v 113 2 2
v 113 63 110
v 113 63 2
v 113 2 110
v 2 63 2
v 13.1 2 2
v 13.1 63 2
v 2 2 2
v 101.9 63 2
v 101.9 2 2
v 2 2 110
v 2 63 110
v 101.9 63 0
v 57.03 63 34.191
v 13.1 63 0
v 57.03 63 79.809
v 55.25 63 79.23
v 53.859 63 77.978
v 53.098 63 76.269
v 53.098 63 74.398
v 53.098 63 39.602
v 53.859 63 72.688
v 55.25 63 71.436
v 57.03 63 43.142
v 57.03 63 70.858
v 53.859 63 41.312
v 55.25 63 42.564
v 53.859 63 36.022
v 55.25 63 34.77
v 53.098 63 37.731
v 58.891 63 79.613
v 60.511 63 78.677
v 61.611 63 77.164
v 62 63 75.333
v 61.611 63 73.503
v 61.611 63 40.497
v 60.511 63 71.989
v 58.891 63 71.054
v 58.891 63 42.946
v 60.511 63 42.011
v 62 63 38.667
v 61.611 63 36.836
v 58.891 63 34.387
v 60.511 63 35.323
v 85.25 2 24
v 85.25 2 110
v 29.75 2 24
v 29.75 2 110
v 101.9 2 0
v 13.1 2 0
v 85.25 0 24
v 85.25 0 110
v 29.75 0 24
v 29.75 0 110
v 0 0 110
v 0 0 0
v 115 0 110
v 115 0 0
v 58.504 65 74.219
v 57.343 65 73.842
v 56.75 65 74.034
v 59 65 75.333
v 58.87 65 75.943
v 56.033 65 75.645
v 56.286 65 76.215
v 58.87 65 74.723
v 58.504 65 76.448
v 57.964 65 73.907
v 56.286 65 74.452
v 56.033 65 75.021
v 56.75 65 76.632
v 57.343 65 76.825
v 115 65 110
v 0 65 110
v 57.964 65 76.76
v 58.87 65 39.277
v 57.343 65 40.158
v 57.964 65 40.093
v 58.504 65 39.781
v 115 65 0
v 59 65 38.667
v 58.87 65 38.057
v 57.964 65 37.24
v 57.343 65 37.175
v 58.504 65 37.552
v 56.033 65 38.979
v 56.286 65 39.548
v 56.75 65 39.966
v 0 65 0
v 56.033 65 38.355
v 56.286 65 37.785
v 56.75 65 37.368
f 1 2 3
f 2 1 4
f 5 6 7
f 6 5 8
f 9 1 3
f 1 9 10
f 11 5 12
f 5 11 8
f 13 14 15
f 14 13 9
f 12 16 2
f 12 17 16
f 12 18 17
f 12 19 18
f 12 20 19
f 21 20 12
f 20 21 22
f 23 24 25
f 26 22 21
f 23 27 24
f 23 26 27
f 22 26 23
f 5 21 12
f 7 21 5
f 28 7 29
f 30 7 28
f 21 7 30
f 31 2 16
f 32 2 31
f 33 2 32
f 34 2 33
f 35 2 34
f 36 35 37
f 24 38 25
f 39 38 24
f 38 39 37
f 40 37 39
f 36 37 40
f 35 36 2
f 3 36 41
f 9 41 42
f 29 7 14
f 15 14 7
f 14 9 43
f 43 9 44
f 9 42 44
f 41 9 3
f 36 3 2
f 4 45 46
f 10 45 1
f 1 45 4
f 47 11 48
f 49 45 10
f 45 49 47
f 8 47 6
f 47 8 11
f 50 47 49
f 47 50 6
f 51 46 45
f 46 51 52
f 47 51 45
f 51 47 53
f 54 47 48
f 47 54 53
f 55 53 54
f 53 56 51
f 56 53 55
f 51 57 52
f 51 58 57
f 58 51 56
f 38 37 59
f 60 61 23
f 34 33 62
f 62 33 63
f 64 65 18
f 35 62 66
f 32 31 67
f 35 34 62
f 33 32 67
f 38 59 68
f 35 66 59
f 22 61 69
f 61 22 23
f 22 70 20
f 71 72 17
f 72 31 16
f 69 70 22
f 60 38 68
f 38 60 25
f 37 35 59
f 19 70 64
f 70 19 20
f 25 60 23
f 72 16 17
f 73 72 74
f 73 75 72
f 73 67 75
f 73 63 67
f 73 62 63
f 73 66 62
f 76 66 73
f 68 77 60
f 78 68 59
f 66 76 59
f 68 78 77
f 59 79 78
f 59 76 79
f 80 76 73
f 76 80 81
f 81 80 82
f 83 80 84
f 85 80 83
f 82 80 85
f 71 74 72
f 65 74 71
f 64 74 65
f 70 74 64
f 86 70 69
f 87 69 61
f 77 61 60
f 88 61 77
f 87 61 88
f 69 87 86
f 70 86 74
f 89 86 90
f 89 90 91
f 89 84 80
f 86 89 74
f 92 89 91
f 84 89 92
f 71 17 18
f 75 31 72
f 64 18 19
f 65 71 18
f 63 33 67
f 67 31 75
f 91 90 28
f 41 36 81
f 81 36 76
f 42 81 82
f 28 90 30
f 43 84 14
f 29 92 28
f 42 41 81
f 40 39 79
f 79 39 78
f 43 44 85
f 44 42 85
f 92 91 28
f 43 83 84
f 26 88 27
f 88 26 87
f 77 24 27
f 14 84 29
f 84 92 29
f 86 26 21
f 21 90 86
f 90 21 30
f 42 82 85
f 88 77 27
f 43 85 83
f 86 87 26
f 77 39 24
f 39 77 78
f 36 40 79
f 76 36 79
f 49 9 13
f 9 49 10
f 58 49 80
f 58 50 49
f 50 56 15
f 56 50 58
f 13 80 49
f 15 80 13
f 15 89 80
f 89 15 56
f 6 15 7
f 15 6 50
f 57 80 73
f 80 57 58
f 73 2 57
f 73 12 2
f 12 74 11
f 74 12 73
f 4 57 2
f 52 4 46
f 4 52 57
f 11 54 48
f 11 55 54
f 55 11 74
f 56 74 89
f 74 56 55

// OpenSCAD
/* [Thickness of holder walls] */
wall_thickness = 2; // [2:10]

// Enter the glove box details. Best to slightly oversize by maybe a mm
/* [Glove box dimensions (oversize for easier fit) */
box_width = 111; // [100:400]
box_depth = 61; // [40:170]
box_height = 220; // [100:400]

/* [Screw hole sizes] */
screw_size = 3; // [2:10]


difference() {
    cube([box_width+(2*wall_thickness), box_depth+(2*wall_thickness), box_height/2]);
    translate([wall_thickness, wall_thickness, wall_thickness])
        union() {
            cube([box_width, box_depth, box_height/2]); // Actual box
            translate([box_width/4, -wall_thickness, box_height*0.1])
                cube([box_width/2, wall_thickness, 2*(box_height/4)]); //Slot for getting gloves
            translate([box_width*0.5, box_depth+wall_thickness, (box_height/3) ])
                rotate(a=[90,0,0])
                    cylinder(wall_thickness,d1=screw_size,d2=screw_size*3,false); //Lower Screw hole
            translate([box_width*0.5, box_depth+wall_thickness, (box_height/6) ])
                rotate(a=[90,0,0])
                    cylinder(wall_thickness,d1=screw_size,d2=screw_size*3,false);  // Upper Screw hole
            translate([box_width*0.1,0,-wall_thickness])
               cube([box_width*0.8,box_depth,wall_thickness]); // Save some filament, don't need the bottom to be whole
            }
       
}
